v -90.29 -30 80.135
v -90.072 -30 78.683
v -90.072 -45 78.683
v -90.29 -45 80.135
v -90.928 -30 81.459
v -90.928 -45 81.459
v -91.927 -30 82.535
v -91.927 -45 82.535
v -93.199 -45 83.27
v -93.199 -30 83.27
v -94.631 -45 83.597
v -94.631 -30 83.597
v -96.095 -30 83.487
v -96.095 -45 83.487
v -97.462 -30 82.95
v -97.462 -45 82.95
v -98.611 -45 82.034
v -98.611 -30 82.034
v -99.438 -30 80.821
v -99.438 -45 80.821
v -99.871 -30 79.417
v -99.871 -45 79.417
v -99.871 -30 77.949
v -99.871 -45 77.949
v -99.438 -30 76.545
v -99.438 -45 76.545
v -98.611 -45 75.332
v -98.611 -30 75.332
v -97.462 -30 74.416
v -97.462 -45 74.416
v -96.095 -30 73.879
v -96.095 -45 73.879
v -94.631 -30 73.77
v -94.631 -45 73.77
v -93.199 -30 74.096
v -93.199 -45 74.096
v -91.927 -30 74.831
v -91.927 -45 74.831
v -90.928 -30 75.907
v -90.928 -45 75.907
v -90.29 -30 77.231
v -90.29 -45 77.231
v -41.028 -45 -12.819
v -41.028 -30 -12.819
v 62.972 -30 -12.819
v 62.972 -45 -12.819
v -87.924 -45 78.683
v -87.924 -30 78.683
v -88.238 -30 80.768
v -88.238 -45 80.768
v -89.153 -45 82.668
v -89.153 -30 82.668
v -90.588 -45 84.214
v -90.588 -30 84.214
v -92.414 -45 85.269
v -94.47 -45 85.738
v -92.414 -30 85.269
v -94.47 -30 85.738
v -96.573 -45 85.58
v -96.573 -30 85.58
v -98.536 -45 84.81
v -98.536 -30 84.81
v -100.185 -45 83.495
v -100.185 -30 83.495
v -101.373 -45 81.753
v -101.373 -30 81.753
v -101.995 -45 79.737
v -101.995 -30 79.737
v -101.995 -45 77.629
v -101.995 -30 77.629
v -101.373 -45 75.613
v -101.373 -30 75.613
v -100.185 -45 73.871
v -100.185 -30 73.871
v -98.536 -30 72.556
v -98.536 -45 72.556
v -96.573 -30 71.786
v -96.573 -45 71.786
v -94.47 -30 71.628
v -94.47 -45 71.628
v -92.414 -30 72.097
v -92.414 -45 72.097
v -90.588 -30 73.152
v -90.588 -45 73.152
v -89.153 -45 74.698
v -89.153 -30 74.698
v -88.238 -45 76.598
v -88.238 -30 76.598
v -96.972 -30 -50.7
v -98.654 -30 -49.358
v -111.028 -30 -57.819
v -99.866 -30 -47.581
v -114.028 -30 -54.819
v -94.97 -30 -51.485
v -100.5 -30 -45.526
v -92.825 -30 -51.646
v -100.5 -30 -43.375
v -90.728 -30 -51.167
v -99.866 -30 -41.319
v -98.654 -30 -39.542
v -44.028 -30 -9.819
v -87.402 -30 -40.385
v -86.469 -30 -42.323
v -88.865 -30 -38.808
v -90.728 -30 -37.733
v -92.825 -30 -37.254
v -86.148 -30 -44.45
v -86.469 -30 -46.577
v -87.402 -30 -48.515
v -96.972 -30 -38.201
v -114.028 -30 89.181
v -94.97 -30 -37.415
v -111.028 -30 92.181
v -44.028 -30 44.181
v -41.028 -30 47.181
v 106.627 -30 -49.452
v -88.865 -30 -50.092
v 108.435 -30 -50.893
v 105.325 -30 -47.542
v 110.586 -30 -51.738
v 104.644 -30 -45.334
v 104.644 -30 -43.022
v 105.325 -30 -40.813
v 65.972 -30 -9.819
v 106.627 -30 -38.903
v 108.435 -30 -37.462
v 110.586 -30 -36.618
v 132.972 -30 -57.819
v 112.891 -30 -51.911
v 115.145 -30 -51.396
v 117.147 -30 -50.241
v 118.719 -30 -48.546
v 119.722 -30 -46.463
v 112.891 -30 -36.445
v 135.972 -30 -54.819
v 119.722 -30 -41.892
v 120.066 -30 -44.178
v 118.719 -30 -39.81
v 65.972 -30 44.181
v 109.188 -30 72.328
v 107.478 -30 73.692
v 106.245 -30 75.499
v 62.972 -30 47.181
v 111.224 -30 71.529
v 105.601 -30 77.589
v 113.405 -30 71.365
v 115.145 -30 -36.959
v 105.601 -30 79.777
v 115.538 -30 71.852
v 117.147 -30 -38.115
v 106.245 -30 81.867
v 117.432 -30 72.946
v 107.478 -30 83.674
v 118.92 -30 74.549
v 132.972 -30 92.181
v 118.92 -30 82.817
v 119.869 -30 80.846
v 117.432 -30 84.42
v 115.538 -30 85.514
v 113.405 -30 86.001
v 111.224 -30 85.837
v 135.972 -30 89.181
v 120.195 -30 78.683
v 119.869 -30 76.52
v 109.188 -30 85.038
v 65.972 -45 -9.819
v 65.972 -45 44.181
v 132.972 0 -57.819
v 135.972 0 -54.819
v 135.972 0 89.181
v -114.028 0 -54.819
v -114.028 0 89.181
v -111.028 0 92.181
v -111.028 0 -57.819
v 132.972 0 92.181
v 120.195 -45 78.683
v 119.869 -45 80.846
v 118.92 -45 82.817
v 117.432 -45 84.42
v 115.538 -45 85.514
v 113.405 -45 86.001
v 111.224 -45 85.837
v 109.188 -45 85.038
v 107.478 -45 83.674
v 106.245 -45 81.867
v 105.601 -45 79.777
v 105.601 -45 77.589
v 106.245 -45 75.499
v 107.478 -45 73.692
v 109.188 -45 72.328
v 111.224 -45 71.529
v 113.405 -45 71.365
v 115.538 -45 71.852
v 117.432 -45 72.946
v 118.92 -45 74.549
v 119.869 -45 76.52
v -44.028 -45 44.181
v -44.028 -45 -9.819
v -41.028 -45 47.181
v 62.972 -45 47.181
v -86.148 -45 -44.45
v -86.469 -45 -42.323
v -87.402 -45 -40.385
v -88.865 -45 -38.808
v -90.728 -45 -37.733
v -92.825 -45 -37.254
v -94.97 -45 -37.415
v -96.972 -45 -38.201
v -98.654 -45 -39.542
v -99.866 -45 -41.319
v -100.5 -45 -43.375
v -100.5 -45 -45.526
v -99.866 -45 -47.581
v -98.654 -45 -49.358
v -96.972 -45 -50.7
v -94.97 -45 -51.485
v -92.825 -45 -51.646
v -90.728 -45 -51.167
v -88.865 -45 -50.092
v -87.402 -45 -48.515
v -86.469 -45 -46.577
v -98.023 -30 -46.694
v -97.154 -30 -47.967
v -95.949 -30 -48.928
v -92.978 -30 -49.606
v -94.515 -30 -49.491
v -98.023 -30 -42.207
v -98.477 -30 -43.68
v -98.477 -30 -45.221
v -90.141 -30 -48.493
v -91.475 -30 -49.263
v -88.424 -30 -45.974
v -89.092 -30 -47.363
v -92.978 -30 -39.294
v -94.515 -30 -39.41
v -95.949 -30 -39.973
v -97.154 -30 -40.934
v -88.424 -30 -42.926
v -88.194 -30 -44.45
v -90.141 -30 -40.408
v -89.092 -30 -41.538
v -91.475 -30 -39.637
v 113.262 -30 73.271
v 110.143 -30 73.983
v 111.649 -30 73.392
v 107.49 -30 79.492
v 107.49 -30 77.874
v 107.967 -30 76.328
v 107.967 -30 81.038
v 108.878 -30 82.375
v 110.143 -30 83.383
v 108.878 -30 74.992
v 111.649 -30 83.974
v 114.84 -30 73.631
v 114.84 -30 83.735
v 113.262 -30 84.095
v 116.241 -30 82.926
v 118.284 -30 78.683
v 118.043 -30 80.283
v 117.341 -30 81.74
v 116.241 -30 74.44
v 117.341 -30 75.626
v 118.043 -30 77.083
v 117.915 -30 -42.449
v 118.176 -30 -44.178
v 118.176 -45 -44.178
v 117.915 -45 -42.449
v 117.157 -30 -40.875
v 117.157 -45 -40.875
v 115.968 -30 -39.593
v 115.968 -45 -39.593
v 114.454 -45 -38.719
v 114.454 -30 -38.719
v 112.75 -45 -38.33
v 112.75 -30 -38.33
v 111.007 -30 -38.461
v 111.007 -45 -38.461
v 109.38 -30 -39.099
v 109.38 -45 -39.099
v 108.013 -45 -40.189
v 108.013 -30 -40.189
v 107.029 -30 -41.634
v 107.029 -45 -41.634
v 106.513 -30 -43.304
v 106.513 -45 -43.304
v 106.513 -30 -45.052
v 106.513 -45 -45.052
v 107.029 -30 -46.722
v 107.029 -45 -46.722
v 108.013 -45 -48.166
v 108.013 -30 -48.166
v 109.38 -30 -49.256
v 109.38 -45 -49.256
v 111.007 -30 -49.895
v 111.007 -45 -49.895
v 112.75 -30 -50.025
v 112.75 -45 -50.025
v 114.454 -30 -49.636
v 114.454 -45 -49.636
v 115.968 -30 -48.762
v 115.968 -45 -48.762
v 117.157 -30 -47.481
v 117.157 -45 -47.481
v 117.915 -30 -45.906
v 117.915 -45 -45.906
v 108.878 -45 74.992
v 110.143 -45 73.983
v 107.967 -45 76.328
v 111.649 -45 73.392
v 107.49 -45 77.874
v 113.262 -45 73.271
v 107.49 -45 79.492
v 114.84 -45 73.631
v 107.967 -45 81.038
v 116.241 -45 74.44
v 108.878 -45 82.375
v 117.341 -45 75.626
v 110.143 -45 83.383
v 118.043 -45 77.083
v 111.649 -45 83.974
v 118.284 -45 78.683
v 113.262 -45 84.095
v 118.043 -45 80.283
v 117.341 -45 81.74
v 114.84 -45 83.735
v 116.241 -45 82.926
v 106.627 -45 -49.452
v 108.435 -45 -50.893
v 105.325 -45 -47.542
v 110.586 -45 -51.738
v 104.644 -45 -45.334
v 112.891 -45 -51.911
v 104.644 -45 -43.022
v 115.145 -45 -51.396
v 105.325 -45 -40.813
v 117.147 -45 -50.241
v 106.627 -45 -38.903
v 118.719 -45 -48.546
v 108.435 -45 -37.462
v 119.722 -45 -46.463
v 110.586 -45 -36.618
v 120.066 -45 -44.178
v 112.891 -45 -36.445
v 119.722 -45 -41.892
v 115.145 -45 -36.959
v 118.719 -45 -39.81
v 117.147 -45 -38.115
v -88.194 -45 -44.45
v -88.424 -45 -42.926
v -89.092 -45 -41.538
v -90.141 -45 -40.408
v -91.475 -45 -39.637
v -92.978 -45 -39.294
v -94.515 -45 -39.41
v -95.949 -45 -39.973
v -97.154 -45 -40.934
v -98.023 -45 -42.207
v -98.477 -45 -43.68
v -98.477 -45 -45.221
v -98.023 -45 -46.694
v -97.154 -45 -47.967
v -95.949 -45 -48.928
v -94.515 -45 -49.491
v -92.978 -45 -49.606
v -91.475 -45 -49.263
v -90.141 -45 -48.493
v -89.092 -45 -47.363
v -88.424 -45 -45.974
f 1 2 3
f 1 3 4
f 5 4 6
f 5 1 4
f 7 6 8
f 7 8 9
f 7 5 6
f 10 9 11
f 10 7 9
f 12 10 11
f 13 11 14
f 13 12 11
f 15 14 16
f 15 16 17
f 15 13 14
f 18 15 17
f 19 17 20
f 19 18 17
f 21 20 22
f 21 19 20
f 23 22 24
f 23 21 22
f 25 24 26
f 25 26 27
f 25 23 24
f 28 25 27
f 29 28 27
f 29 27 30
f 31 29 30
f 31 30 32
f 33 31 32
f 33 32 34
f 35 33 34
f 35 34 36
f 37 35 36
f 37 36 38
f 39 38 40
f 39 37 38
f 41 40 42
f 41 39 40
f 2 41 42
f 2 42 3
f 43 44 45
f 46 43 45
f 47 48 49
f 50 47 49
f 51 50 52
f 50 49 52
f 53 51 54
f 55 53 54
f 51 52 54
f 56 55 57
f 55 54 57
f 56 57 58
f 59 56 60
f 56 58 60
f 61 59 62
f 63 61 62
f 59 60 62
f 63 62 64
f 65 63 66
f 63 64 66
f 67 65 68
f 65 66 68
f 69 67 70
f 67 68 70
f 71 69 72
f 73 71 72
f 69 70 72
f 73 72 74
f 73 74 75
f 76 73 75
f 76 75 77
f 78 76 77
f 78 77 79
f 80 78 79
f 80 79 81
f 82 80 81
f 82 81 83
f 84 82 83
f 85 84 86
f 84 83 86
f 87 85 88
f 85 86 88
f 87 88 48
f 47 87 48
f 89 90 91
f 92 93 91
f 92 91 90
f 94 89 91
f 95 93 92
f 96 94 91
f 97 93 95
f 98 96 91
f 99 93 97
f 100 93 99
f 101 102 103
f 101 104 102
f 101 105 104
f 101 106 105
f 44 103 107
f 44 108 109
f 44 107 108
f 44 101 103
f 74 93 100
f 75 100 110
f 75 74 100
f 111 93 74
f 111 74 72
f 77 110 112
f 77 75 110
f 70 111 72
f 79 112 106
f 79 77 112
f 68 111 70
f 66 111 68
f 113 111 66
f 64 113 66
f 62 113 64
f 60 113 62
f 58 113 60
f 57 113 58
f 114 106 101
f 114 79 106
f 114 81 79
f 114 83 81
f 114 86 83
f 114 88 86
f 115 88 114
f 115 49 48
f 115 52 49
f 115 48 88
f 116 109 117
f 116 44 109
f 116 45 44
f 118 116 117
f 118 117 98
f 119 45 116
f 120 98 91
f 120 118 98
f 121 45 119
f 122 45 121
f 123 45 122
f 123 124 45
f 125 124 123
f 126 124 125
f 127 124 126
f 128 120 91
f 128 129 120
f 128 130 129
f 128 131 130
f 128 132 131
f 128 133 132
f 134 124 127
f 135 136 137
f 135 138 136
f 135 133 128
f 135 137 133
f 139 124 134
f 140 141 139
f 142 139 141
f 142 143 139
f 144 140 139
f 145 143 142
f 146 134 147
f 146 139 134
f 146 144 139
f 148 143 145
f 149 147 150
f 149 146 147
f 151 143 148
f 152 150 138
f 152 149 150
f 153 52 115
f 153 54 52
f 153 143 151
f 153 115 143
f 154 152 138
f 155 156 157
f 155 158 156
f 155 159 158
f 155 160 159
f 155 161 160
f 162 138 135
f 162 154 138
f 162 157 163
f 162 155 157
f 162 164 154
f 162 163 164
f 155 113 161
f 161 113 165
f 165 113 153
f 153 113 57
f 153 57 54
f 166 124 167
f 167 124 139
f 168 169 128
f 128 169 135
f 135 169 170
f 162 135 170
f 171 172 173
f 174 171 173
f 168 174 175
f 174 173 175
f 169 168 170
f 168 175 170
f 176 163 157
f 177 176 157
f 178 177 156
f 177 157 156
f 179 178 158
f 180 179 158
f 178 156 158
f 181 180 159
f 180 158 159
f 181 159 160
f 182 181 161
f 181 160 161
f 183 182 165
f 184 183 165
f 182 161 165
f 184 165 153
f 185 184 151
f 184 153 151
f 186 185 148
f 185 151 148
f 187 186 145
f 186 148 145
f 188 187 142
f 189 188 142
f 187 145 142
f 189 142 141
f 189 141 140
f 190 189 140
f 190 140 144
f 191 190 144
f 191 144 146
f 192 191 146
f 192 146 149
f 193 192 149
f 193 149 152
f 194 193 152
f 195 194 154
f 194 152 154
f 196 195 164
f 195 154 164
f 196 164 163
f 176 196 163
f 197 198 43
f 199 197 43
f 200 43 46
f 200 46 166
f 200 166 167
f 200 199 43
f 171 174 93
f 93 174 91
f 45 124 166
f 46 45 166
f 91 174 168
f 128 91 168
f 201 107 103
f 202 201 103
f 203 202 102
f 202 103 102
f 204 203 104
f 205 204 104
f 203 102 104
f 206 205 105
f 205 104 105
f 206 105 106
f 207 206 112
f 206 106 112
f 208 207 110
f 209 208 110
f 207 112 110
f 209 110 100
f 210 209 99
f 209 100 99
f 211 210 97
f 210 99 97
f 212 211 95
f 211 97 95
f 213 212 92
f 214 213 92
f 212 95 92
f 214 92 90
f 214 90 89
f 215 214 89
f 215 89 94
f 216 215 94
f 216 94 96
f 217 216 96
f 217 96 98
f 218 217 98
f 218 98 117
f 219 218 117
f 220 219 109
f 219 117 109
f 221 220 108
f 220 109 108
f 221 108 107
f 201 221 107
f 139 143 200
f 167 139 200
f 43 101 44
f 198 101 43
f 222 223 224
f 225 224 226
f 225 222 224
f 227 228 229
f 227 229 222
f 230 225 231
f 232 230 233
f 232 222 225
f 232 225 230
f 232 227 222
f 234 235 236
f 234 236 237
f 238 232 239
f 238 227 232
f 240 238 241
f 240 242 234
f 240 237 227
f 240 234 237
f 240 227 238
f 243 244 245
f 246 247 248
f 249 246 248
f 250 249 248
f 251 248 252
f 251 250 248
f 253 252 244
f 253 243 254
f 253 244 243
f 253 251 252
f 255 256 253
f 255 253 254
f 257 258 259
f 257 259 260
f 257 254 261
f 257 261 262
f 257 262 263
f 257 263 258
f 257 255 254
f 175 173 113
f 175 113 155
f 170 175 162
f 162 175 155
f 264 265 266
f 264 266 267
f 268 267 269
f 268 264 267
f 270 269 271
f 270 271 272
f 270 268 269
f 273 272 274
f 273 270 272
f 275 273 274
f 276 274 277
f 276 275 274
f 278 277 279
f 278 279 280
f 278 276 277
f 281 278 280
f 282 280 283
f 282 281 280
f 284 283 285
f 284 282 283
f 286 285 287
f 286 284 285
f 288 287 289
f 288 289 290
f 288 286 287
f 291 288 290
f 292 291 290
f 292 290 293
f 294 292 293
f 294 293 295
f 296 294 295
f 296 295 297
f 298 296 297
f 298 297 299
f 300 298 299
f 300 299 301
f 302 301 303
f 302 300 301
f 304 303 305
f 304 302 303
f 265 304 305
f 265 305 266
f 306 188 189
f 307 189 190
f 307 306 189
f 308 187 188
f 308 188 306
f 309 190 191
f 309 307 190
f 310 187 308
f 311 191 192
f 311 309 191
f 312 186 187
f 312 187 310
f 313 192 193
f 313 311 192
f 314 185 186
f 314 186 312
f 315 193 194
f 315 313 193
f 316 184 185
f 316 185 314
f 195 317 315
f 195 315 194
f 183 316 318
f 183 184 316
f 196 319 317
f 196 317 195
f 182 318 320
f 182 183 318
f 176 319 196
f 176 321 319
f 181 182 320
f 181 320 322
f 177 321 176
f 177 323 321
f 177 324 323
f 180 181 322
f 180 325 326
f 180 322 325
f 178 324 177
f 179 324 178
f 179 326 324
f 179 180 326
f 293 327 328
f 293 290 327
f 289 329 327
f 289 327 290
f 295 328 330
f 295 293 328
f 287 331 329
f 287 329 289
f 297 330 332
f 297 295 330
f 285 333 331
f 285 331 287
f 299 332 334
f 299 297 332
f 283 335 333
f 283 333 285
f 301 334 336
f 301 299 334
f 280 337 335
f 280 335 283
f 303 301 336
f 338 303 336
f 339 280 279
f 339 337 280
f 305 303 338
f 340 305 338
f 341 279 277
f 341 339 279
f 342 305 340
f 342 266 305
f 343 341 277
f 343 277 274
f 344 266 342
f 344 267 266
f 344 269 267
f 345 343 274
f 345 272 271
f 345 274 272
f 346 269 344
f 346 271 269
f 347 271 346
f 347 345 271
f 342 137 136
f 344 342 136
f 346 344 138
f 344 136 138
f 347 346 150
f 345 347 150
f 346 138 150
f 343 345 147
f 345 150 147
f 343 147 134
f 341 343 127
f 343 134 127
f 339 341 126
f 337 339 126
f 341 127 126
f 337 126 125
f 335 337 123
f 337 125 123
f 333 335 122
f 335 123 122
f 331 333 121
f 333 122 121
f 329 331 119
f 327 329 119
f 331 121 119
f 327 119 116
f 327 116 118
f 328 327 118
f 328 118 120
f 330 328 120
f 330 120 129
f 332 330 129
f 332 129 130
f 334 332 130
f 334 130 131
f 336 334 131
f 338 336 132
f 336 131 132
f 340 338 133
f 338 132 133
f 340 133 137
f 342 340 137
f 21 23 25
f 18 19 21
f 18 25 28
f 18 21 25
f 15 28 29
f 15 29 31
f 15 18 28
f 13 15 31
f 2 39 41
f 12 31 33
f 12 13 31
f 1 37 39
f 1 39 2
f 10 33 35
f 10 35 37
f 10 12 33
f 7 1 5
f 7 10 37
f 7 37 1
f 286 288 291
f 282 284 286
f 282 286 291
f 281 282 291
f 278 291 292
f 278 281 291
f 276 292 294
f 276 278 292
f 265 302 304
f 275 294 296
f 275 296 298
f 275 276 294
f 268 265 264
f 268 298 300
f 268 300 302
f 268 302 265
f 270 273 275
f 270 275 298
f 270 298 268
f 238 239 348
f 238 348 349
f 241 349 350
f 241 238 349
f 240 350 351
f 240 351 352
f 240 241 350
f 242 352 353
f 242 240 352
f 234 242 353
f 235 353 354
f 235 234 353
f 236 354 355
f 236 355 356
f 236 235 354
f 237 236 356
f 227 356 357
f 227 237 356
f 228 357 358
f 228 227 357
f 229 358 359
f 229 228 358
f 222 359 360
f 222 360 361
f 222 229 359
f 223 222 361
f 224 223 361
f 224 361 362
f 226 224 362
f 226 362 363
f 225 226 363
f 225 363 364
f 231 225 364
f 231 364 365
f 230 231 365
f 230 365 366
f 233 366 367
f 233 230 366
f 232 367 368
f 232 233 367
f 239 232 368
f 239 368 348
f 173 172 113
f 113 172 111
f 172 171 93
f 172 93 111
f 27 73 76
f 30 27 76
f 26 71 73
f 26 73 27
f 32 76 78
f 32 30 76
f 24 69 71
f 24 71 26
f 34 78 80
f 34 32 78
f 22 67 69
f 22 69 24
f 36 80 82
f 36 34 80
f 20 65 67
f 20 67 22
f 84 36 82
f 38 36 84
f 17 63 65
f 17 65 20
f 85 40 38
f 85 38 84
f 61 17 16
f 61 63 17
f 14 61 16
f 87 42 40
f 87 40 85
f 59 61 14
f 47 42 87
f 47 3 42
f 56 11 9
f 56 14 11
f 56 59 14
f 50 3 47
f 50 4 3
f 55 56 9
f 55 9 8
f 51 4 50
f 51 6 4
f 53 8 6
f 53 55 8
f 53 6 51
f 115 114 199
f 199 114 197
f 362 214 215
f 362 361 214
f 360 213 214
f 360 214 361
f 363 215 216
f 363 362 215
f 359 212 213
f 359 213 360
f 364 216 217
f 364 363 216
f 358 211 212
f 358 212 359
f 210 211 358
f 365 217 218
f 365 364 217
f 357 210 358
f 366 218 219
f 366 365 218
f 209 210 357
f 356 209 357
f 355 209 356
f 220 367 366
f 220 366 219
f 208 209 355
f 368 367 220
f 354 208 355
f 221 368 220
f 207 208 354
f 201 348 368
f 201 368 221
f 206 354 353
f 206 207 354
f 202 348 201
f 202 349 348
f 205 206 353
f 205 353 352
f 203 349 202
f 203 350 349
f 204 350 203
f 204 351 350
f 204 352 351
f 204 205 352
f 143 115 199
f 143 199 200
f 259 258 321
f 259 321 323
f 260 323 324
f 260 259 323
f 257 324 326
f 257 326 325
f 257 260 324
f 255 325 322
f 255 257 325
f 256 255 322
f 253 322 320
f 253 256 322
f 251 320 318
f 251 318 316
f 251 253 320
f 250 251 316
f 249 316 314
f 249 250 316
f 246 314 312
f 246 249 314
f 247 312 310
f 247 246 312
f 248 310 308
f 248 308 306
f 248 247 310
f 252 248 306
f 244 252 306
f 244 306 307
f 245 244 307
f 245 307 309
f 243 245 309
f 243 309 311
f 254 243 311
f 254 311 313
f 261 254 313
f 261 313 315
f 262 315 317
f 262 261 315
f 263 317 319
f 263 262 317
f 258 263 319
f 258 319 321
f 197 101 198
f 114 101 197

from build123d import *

# Parameters (mm, degrees)
F0_W      = 250
F0_H      = 150
F1_DEPTH  = 30
F2_SIZE   = 3
F3_SIZE   = 3
F4_SIZE   = 3
F5_SIZE   = 3
F6_W      = 110
F6_H      = 60
F7_DEPTH  = 15
F8_SIZE   = 3
F9_R      = 7.216075
F9_R_2    = 5.170271
F9_R_3    = 7.754468
F9_R_4    = 5.863946
F9_R_5    = 7.338113
F9_R_6    = 5.427253
F9_R_7    = 7.074755
F9_R_8    = 4.927232
F10_DEPTH = 15


with BuildPart() as f1:
    # F0 (on Front) → F1 (new body)
    with BuildSketch(Plane.XZ):
        with Locations((10.972098, 17.180756)):
            Rectangle(F0_W, F0_H)
    extrude(amount=F1_DEPTH)

    # F2
    f2_edges = [f1.edges().sort_by_distance(p)[0] for p in [
        (-114.027902, -15, -57.819244),
    ]]
    chamfer(f2_edges, length=F2_SIZE)

    # F3
    f3_edges = [f1.edges().sort_by_distance(p)[0] for p in [
        (135.972098, -15, -57.819244),
    ]]
    chamfer(f3_edges, length=F3_SIZE)

    # F4
    f4_edges = [f1.edges().sort_by_distance(p)[0] for p in [
        (135.972098, -15, 92.180756),
    ]]
    chamfer(f4_edges, length=F4_SIZE)

    # F5
    f5_edges = [f1.edges().sort_by_distance(p)[0] for p in [
        (-114.027902, -15, 92.180756),
    ]]
    chamfer(f5_edges, length=F5_SIZE)

    # F6 (on face) → F7 (join)
    with BuildSketch(Plane.XZ.offset(30)):
        with Locations((10.972098, 17.180756)):
            Rectangle(F6_W, F6_H)
    extrude(amount=F7_DEPTH)

    # F8
    f8_edges = [f1.edges().sort_by_distance(p)[0] for p in [
        (-44.027902, -37.5, -12.819244),
        (-44.027902, -37.5, 47.180756),
        (65.972098, -37.5, -12.819244),
        (65.972098, -37.5, 47.180756),
    ]]
    chamfer(f8_edges, length=F8_SIZE)

    # F9 (on face) → F10 (join)
    with BuildSketch(Plane.XZ.offset(30)):
        with Locations((-93.364298, -44.450238)):
            Circle(F9_R)
        with Locations((-93.364298, -44.450238)):
            Circle(F9_R_2, mode=Mode.SUBTRACT)
        with Locations((112.311885, -44.177815)):
            Circle(F9_R_3)
        with Locations((112.311885, -44.177815)):
            Circle(F9_R_4, mode=Mode.SUBTRACT)
        with Locations((112.856723, 78.683056)):
            Circle(F9_R_5)
        with Locations((112.856723, 78.683056)):
            Circle(F9_R_6, mode=Mode.SUBTRACT)
        with Locations((-94.998814, 78.683056)):
            Circle(F9_R_7)
        with Locations((-94.998814, 78.683056)):
            Circle(F9_R_8, mode=Mode.SUBTRACT)
    extrude(amount=F10_DEPTH)


solid = f1.part
